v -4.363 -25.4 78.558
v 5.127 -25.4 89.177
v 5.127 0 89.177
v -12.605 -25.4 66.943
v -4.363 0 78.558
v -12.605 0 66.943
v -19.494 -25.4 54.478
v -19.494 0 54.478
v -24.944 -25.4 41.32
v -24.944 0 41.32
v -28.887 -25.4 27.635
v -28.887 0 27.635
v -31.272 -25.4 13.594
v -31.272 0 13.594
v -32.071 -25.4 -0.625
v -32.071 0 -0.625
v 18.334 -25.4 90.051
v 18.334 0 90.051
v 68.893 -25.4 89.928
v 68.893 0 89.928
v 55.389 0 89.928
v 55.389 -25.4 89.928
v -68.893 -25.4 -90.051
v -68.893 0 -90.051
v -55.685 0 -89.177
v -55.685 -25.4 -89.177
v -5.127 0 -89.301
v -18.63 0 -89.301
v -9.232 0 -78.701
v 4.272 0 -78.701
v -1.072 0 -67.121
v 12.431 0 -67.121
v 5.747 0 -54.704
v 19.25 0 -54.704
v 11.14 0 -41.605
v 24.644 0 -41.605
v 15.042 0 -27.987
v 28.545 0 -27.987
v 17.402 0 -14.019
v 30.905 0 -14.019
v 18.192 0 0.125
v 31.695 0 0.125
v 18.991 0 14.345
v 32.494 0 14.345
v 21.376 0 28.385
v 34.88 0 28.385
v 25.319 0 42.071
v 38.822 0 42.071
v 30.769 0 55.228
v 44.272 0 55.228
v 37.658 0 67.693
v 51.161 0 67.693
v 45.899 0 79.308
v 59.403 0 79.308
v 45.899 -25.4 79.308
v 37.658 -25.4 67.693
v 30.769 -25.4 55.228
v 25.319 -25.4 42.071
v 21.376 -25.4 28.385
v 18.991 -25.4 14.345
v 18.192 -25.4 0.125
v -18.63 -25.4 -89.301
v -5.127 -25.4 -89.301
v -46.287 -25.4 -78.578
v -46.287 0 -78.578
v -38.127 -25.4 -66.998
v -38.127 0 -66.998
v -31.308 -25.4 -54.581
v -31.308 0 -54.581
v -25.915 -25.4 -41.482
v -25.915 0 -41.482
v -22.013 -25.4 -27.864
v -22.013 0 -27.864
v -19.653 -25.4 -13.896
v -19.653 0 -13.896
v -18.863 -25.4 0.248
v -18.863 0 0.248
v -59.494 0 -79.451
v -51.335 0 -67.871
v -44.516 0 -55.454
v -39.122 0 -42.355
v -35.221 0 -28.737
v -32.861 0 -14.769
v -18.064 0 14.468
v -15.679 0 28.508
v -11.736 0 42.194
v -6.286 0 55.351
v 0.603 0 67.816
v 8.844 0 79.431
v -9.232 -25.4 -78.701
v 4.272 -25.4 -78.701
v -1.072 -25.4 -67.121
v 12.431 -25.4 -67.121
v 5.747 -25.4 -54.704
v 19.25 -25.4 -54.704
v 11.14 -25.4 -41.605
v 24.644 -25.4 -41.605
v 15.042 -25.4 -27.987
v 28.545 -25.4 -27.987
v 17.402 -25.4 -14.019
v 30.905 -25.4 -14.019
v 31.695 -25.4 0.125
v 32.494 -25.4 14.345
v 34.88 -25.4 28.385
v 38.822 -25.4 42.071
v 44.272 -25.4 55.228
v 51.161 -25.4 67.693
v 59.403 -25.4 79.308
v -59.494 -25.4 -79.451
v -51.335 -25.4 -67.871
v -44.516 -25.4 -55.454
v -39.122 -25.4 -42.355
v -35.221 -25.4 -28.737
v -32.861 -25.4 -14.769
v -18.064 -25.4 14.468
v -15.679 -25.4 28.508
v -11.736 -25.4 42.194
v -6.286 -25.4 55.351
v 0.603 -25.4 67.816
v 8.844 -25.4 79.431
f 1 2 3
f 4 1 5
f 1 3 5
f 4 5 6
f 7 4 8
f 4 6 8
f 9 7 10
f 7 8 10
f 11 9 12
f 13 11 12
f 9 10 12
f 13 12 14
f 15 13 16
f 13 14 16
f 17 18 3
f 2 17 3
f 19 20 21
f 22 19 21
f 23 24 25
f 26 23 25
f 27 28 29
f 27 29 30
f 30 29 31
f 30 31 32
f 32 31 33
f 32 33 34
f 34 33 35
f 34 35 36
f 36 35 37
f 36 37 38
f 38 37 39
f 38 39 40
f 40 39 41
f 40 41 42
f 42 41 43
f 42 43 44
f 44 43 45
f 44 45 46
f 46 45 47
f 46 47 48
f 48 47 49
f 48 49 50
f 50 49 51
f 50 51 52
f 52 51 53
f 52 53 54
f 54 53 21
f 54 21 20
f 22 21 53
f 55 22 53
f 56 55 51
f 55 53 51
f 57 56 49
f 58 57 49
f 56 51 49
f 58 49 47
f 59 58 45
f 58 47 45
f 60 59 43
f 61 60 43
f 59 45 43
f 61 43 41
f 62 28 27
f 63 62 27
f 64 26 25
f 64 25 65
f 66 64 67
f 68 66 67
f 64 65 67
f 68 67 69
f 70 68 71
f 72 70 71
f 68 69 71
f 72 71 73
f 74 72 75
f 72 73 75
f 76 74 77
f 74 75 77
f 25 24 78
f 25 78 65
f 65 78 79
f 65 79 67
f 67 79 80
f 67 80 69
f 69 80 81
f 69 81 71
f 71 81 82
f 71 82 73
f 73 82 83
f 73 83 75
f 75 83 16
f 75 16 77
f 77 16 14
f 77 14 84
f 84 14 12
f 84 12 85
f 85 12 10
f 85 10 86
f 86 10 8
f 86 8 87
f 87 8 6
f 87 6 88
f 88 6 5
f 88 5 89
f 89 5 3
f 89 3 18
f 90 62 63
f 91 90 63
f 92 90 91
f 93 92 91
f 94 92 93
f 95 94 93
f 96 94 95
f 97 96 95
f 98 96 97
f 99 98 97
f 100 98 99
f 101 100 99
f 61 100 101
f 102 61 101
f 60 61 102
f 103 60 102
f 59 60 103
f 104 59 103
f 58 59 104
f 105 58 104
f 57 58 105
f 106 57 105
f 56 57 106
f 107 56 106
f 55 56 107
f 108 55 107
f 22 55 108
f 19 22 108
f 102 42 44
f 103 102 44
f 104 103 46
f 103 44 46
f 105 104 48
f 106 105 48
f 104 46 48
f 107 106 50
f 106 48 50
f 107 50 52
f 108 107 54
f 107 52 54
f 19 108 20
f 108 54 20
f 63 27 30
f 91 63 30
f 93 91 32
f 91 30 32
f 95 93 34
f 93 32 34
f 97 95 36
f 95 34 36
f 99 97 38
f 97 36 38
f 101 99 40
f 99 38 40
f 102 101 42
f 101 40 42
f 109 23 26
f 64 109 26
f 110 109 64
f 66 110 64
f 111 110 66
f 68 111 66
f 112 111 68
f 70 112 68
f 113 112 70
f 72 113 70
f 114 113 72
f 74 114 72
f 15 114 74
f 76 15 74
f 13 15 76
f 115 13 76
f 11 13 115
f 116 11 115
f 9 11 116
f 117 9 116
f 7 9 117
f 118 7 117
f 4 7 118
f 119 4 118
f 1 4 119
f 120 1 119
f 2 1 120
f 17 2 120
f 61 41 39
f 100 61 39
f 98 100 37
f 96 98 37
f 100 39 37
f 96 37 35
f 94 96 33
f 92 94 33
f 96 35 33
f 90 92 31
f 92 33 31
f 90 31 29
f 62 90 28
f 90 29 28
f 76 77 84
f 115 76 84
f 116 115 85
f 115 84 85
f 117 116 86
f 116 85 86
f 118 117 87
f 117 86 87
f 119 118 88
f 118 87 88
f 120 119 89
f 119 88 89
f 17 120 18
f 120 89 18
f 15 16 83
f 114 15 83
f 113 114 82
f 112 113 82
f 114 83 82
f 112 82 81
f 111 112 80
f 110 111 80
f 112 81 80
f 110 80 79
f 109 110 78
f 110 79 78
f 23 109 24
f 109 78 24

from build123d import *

# Parameters (mm, degrees)
F1_DEPTH = 25.4


# Not quite as in the source:
# - ends of sketch curves that miss each other by under 0.0002 mm in the source are joined


with BuildPart() as f1:
    # F0 (on Front) → F1 (new body)
    with BuildSketch(Plane.XZ):
        with BuildLine():
            Line((-68.8927756, -90.0507216), (-55.6850804, -89.177495))
            ThreePointArc((-55.6850804, -89.177495), (-28.4287580313, -48.1068164863), (-18.8629798, 0.248158))
            ThreePointArc((-18.8629798, 0.248158), (-9.1956804289, 48.8489539104), (18.3344589893, 90.0507192107))
            Line((18.3344589893, 90.0507192107), (5.126736, 89.177495))
            ThreePointArc((5.126736, 89.177495), (-22.4034010289, 47.9757273104), (-32.0707004, -0.6250686))
            ThreePointArc((-32.0707004, -0.6250686), (-41.6364752264, -48.9800348173), (-68.8927756, -90.0507216))
        make_face()
    extrude(amount=F1_DEPTH)


with BuildPart() as f1b:
    # F0 (on Front) → F1, piece 2 (new body)
    with BuildSketch(Plane.XZ):
        with BuildLine():
            ThreePointArc((18.1919626, 0.1251204), (8.6261843687, -48.2298540863), (-18.6301406688, -89.3005299535))
            Line((-18.6301406688, -89.3005299535), (-5.126736, -89.3005326))
            ThreePointArc((-5.126736, -89.3005326), (22.1295863687, -48.2298540863), (31.6953646, 0.1251204))
            ThreePointArc((31.6953646, 0.1251204), (41.3626639711, 48.7259163104), (68.8928033893, 89.9276816107))
            Line((68.8928033893, 89.9276816107), (55.389399, 89.927684))
            ThreePointArc((55.389399, 89.927684), (27.8592619711, 48.7259163104), (18.1919626, 0.1251204))
        make_face()
    extrude(amount=F1_DEPTH)


solid = Compound([f1.part, f1b.part])
